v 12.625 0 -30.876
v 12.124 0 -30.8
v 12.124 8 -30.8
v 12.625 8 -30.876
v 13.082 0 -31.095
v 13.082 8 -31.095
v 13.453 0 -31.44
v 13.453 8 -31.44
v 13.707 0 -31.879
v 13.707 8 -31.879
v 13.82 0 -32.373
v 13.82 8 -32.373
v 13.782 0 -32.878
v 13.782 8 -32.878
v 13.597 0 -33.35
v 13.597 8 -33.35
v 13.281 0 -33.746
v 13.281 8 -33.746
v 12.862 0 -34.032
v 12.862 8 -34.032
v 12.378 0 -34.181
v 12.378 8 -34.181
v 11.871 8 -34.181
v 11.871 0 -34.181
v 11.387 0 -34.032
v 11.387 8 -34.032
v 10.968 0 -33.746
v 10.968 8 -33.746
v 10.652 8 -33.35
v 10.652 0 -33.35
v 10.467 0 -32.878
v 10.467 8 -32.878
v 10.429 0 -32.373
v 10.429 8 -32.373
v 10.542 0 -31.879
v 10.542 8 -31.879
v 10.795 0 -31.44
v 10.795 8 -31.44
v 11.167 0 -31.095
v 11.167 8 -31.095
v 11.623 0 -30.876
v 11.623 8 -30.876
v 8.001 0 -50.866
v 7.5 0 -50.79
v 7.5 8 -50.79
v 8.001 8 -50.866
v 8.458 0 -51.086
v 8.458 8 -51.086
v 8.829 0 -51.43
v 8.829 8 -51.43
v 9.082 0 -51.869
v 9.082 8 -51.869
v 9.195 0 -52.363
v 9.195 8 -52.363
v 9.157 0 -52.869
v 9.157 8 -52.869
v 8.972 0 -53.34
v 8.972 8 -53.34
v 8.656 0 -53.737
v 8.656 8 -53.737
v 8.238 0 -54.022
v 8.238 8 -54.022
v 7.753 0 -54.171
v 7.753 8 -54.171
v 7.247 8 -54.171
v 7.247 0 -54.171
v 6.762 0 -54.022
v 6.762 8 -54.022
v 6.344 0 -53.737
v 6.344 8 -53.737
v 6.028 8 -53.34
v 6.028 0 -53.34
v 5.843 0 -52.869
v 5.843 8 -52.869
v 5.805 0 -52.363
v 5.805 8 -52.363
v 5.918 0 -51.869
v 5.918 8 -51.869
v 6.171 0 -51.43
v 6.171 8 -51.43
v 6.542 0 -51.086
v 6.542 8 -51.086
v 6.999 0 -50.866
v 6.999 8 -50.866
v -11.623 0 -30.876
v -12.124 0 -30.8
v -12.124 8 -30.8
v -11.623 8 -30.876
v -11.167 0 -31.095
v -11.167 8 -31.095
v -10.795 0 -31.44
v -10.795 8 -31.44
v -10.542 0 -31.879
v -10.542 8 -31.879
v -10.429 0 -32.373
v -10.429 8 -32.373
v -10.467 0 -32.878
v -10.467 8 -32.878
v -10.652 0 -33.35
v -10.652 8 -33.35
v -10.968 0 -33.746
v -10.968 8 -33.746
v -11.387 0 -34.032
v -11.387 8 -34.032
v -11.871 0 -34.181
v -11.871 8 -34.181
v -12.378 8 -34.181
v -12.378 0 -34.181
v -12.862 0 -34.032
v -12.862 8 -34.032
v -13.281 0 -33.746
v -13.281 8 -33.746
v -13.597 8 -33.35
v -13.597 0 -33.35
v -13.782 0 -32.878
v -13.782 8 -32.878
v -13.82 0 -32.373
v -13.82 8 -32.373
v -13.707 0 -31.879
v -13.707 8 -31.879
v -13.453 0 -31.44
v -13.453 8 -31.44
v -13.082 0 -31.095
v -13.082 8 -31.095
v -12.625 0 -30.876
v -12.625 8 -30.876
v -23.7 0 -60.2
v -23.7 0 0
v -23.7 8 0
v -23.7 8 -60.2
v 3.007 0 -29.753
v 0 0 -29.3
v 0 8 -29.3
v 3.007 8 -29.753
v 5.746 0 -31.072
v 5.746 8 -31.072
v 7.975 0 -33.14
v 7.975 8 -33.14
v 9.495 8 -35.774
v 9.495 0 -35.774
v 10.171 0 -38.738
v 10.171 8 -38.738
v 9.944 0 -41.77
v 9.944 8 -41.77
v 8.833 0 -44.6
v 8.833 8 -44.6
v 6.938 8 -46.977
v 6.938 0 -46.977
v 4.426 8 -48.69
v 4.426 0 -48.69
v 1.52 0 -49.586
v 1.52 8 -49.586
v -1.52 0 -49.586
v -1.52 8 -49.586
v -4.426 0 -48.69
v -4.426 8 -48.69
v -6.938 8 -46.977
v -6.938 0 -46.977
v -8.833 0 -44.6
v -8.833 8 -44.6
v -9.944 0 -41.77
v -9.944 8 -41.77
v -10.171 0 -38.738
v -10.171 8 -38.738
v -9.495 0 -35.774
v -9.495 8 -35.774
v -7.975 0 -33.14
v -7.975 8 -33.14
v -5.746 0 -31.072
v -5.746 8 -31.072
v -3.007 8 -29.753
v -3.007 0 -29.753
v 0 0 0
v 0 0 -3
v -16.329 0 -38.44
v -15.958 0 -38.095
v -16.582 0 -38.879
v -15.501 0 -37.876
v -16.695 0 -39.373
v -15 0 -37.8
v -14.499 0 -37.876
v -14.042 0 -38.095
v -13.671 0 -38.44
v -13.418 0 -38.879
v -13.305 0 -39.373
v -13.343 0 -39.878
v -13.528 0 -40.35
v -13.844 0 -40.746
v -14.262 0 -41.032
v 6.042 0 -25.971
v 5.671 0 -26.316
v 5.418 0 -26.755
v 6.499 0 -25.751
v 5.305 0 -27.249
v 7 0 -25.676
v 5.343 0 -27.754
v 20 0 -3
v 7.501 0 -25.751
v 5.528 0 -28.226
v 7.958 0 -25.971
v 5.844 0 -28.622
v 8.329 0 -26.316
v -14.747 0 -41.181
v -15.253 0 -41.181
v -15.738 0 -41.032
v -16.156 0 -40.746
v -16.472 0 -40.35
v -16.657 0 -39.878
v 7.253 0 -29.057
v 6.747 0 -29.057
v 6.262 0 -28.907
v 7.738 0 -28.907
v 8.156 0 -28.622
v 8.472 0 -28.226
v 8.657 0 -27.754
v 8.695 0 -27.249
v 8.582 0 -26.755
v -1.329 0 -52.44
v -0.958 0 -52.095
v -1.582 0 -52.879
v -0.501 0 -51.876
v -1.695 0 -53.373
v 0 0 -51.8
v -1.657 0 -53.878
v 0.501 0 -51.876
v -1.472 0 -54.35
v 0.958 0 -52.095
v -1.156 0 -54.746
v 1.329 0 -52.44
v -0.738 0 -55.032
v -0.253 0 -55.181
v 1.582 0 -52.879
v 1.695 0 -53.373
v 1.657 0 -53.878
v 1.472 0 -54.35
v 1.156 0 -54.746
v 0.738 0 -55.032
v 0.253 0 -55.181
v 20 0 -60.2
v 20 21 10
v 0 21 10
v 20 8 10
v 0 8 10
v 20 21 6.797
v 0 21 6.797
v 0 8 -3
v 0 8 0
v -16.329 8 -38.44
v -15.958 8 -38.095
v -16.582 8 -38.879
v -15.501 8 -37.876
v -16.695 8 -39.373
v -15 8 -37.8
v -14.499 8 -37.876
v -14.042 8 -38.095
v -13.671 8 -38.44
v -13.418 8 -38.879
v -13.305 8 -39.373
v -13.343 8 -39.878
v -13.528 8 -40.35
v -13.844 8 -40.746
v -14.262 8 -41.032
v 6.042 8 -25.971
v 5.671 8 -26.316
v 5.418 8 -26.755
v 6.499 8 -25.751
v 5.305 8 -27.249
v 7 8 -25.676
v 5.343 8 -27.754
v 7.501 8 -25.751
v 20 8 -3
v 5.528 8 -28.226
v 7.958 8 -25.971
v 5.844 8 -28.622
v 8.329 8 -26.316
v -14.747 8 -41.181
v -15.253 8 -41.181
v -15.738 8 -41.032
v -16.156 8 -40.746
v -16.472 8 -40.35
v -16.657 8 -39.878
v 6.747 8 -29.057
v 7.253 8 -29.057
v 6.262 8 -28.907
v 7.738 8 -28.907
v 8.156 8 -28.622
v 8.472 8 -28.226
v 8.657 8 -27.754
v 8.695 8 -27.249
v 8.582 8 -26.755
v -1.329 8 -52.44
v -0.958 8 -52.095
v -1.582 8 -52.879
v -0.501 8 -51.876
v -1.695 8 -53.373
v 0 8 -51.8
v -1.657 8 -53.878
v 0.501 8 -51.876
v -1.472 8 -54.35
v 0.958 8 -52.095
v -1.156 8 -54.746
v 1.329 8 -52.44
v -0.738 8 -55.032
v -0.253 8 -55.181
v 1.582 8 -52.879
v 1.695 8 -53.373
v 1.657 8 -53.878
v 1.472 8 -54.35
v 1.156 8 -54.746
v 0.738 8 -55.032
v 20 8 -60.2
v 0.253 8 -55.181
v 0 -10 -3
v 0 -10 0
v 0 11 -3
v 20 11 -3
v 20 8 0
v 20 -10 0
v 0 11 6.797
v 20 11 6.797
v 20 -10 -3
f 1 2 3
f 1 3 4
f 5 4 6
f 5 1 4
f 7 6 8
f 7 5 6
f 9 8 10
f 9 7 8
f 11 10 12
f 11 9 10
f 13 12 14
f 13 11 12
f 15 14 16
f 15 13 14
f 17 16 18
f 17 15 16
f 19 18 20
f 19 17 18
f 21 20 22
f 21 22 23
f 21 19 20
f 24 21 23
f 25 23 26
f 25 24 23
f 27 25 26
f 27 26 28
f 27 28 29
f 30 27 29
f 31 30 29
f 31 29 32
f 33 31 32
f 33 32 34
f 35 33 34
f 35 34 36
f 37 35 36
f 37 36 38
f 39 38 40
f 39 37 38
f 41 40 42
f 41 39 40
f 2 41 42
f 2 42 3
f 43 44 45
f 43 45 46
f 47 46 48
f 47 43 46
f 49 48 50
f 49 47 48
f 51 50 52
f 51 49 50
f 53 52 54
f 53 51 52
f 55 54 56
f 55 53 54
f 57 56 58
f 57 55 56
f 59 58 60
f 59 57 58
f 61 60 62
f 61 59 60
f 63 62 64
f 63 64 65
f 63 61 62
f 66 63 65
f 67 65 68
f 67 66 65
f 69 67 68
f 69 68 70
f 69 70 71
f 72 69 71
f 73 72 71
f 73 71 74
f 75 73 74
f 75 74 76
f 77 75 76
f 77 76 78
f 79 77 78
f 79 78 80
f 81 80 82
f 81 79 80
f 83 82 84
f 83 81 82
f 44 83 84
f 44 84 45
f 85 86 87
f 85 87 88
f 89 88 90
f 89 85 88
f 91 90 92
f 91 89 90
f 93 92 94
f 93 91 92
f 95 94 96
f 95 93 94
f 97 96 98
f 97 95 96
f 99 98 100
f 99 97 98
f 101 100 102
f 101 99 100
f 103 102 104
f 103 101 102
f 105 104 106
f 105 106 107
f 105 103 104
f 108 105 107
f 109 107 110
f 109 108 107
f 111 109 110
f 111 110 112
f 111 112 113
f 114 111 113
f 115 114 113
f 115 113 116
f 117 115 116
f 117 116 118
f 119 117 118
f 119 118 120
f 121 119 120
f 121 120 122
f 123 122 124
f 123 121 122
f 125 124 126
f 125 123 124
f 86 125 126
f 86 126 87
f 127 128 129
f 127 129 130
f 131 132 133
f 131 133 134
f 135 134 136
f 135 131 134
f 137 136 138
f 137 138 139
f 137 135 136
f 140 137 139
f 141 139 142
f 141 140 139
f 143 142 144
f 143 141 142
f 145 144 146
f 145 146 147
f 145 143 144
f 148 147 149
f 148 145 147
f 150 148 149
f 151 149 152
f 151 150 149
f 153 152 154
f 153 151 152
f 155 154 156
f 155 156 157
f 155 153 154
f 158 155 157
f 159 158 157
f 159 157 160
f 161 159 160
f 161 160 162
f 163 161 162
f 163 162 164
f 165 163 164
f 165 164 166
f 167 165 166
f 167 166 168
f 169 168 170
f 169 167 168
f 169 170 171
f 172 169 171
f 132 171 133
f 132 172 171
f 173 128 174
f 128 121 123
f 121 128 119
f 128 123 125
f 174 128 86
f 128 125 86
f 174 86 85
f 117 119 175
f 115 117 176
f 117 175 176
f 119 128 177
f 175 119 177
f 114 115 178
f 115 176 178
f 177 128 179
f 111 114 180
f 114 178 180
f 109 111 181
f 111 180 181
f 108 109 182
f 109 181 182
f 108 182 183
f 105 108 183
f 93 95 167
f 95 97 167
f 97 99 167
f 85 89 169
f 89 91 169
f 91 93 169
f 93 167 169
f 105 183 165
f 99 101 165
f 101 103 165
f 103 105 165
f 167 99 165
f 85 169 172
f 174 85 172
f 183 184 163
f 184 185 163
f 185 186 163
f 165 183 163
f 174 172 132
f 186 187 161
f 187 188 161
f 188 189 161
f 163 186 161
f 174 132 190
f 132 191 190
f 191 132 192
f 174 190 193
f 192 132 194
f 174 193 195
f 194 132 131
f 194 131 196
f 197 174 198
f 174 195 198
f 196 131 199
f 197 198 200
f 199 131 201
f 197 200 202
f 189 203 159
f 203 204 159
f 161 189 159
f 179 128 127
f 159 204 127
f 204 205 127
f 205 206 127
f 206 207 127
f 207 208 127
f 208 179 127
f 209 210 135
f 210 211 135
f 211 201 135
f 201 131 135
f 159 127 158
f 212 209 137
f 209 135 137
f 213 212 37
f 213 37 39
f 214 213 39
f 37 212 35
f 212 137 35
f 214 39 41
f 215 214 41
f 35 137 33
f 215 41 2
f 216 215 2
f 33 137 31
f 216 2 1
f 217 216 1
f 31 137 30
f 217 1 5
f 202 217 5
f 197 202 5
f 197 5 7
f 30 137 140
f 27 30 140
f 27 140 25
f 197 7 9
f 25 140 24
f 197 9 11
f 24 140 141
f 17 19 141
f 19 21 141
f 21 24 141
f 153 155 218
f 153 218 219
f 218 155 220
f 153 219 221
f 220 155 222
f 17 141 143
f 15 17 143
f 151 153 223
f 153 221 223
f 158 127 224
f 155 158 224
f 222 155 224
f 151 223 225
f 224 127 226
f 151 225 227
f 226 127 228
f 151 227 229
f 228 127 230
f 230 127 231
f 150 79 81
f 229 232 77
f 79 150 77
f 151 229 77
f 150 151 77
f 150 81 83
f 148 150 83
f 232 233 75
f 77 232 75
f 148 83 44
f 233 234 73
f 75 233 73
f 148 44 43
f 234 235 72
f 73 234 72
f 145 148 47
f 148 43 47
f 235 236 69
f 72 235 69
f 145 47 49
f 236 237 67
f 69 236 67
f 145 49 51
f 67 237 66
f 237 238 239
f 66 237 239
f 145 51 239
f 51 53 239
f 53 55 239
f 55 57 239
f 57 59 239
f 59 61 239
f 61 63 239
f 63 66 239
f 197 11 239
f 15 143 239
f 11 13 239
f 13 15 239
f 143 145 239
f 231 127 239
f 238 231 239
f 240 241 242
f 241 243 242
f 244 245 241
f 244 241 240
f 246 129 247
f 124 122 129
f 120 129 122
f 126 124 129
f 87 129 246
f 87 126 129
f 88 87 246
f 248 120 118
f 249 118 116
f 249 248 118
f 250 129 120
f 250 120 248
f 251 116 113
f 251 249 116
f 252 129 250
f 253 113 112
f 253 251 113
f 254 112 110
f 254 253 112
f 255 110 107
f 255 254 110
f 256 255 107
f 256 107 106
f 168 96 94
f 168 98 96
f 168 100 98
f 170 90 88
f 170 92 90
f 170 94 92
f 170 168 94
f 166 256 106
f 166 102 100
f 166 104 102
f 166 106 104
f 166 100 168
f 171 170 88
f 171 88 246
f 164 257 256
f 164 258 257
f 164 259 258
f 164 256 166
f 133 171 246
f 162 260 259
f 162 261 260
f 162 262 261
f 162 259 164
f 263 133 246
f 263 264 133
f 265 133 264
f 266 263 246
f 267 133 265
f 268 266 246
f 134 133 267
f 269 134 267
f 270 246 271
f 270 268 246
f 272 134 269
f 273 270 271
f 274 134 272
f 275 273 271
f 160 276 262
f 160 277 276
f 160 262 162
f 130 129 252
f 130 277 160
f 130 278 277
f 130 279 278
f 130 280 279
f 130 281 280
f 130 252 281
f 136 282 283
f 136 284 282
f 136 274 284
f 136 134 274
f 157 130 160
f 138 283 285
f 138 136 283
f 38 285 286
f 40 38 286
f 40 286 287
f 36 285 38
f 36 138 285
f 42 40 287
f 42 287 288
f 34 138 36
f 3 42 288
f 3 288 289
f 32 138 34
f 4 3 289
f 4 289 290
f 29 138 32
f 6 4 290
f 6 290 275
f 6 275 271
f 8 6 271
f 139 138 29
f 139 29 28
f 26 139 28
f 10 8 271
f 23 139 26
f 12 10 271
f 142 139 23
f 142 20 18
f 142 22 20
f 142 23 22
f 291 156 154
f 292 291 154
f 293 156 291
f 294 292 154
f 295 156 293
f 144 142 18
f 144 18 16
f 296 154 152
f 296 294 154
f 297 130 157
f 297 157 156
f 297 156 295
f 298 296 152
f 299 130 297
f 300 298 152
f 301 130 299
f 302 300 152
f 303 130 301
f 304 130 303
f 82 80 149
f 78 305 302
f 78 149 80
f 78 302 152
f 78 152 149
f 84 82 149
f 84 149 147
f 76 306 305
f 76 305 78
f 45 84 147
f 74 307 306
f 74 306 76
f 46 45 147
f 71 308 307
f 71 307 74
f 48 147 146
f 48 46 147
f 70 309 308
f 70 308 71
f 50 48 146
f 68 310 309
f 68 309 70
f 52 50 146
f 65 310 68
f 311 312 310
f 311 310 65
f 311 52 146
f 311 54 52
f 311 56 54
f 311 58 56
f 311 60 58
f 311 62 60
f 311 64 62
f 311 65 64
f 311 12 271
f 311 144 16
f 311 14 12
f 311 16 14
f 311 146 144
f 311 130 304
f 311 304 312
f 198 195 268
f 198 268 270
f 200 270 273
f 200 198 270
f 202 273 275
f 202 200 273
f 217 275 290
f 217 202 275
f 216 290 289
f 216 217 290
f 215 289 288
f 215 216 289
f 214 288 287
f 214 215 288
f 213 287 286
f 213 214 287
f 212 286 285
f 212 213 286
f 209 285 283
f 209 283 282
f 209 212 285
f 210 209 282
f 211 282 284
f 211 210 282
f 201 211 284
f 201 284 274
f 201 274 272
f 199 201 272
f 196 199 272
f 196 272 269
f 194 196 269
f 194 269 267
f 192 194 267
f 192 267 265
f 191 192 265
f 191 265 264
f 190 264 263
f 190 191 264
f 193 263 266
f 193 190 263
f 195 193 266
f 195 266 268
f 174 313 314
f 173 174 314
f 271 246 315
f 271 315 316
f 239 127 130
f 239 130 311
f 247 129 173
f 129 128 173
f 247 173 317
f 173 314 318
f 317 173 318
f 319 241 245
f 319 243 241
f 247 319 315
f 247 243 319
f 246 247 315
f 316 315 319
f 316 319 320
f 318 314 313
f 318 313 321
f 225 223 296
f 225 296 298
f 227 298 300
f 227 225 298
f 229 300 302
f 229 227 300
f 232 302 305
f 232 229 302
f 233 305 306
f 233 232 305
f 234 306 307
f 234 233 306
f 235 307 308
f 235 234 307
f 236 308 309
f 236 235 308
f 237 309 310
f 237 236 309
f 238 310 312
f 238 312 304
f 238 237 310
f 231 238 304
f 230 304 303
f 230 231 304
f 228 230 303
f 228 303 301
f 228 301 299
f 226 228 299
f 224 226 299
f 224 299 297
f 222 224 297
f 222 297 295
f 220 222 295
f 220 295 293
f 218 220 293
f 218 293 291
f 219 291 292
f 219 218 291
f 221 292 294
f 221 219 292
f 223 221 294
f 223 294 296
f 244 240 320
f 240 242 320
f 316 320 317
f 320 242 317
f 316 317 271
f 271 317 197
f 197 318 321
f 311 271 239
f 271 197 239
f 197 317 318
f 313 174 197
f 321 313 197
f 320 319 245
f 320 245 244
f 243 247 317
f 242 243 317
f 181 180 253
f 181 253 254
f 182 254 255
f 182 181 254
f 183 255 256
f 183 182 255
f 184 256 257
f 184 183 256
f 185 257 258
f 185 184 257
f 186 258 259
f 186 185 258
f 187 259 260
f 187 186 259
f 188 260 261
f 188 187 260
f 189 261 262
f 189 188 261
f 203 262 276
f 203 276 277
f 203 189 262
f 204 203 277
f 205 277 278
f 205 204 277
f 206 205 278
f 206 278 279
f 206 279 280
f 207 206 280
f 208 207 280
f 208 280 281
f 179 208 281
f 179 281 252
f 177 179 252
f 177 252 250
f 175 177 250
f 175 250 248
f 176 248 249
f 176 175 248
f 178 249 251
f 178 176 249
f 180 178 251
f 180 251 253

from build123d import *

# Parameters (mm, degrees)
SKETCH1_W            = 43.7
SKETCH1_H            = 60.2
SKETCH1_R            = 1.7
SKETCH1_R_2          = 10.2
BOSS_EXTRUDE2_DEPTH  = 8
SKETCH7_W            = 20
SKETCH7_H            = 3
BOSS_EXTRUDE7_DEPTH  = 10
SKETCH8_W            = 20
SKETCH8_H            = 3
BOSS_EXTRUDE8_DEPTH  = 3
SKETCH9_W            = 20
SKETCH9_H            = 3
BOSS_EXTRUDE9_DEPTH  = 10
SKETCH10_W           = 20
SKETCH10_H           = 3.203201764
BOSS_EXTRUDE10_DEPTH = 10


with BuildPart() as part:
    # Sketch1 → Boss-Extrude2 (new body)
    with BuildSketch(Plane(origin=(0, 0, 0), x_dir=(1, 0, 0), z_dir=(0, 1, 0))):
        with Locations((-1.85, 30.1)):
            Rectangle(SKETCH1_W, SKETCH1_H)
        with Locations(Location((7, 27.375644347, 0), (0, 0, 270))):
            Circle(SKETCH1_R, mode=Mode.SUBTRACT)
        with Locations(Location((7.5, 52.490381057, 0), (0, 0, 270))):
            Circle(SKETCH1_R, mode=Mode.SUBTRACT)
        with Locations(Location((0, 53.5, 0), (0, 0, 270))):
            Circle(SKETCH1_R, mode=Mode.SUBTRACT)
        with Locations(Location((-15, 39.5, 0), (0, 0, 270))):
            Circle(SKETCH1_R, mode=Mode.SUBTRACT)
        with Locations(Location((12.124355653, 32.5, 0), (0, 0, 270))):
            Circle(SKETCH1_R, mode=Mode.SUBTRACT)
        with Locations(Location((0, 39.5, 0), (0, 0, 270))):
            Circle(SKETCH1_R_2, mode=Mode.SUBTRACT)
        with Locations(Location((-12.124355653, 32.5, 0), (0, 0, 270))):
            Circle(SKETCH1_R, mode=Mode.SUBTRACT)
    extrude(amount=BOSS_EXTRUDE2_DEPTH)

    # Sketch7 → Boss-Extrude7 (add)
    with BuildSketch(Plane.XZ):
        with Locations((10, -1.5)):
            Rectangle(SKETCH7_W, SKETCH7_H)
    extrude(amount=BOSS_EXTRUDE7_DEPTH)

    # Sketch8 → Boss-Extrude8 (add)
    with BuildSketch(Plane(origin=(0, 8, 0), x_dir=(1, 0, 0), z_dir=(0, 1, 0))):
        with Locations((10, 1.5)):
            Rectangle(SKETCH8_W, SKETCH8_H)
    extrude(amount=BOSS_EXTRUDE8_DEPTH)

    # Sketch9 → Boss-Extrude9 (add)
    with BuildSketch(Plane.XY):
        with Locations((10, 9.5)):
            Rectangle(SKETCH9_W, SKETCH9_H)
    extrude(amount=BOSS_EXTRUDE9_DEPTH)

    # Sketch10 → Boss-Extrude10 (add)
    with BuildSketch(Plane(origin=(0, 11, 0), x_dir=(1, 0, 0), z_dir=(0, 1, 0))):
        with Locations((10, -8.398399118)):
            Rectangle(SKETCH10_W, SKETCH10_H)
    extrude(amount=BOSS_EXTRUDE10_DEPTH)


solid = part.part
